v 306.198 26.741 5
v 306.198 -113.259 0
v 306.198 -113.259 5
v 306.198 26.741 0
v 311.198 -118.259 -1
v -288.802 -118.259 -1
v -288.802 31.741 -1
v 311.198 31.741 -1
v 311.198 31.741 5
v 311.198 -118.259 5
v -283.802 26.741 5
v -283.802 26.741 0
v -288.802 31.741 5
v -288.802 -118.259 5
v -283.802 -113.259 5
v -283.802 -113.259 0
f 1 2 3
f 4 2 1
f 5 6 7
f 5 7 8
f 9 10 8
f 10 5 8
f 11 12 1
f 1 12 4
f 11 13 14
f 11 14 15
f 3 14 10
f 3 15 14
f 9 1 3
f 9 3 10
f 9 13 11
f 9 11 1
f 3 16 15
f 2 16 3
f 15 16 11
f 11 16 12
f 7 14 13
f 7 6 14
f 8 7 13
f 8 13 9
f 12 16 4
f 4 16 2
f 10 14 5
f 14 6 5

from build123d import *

# Parameters (mm, degrees)
F0_W     = 600
F0_H     = 150
F0_W_2   = 590
F0_H_2   = 140
F1_DEPTH = 5
F2_W     = 600
F2_H     = 150
F3_DEPTH = 1
F4_DEPTH = 1


with BuildPart() as f1:
    # F0 (on Top) → F1 (new body)
    with BuildSketch(Plane.XY):
        with Locations((11.197913, -43.259316)):
            Rectangle(F0_W, F0_H)
        with Locations((11.197913, -43.259316)):
            Rectangle(F0_W_2, F0_H_2, mode=Mode.SUBTRACT)
    extrude(amount=F1_DEPTH)

    # F2 (on face) → F3 (join)
    with BuildSketch(Plane(origin=(0, 0, 0), x_dir=(1, 0, 0), z_dir=(0, 0, -1))):
        with Locations((11.197913, 43.259316)):
            Rectangle(F2_W, F2_H)
    extrude(amount=F3_DEPTH)

    # F0 (on Top) → F4 (join)
    with BuildSketch(Plane.XY):
        with Locations((11.197913, -43.259316)):
            Rectangle(F0_W, F0_H)
        with Locations((11.197913, -43.259316)):
            Rectangle(F0_W_2, F0_H_2, mode=Mode.SUBTRACT)
    extrude(amount=F4_DEPTH)


solid = f1.part
